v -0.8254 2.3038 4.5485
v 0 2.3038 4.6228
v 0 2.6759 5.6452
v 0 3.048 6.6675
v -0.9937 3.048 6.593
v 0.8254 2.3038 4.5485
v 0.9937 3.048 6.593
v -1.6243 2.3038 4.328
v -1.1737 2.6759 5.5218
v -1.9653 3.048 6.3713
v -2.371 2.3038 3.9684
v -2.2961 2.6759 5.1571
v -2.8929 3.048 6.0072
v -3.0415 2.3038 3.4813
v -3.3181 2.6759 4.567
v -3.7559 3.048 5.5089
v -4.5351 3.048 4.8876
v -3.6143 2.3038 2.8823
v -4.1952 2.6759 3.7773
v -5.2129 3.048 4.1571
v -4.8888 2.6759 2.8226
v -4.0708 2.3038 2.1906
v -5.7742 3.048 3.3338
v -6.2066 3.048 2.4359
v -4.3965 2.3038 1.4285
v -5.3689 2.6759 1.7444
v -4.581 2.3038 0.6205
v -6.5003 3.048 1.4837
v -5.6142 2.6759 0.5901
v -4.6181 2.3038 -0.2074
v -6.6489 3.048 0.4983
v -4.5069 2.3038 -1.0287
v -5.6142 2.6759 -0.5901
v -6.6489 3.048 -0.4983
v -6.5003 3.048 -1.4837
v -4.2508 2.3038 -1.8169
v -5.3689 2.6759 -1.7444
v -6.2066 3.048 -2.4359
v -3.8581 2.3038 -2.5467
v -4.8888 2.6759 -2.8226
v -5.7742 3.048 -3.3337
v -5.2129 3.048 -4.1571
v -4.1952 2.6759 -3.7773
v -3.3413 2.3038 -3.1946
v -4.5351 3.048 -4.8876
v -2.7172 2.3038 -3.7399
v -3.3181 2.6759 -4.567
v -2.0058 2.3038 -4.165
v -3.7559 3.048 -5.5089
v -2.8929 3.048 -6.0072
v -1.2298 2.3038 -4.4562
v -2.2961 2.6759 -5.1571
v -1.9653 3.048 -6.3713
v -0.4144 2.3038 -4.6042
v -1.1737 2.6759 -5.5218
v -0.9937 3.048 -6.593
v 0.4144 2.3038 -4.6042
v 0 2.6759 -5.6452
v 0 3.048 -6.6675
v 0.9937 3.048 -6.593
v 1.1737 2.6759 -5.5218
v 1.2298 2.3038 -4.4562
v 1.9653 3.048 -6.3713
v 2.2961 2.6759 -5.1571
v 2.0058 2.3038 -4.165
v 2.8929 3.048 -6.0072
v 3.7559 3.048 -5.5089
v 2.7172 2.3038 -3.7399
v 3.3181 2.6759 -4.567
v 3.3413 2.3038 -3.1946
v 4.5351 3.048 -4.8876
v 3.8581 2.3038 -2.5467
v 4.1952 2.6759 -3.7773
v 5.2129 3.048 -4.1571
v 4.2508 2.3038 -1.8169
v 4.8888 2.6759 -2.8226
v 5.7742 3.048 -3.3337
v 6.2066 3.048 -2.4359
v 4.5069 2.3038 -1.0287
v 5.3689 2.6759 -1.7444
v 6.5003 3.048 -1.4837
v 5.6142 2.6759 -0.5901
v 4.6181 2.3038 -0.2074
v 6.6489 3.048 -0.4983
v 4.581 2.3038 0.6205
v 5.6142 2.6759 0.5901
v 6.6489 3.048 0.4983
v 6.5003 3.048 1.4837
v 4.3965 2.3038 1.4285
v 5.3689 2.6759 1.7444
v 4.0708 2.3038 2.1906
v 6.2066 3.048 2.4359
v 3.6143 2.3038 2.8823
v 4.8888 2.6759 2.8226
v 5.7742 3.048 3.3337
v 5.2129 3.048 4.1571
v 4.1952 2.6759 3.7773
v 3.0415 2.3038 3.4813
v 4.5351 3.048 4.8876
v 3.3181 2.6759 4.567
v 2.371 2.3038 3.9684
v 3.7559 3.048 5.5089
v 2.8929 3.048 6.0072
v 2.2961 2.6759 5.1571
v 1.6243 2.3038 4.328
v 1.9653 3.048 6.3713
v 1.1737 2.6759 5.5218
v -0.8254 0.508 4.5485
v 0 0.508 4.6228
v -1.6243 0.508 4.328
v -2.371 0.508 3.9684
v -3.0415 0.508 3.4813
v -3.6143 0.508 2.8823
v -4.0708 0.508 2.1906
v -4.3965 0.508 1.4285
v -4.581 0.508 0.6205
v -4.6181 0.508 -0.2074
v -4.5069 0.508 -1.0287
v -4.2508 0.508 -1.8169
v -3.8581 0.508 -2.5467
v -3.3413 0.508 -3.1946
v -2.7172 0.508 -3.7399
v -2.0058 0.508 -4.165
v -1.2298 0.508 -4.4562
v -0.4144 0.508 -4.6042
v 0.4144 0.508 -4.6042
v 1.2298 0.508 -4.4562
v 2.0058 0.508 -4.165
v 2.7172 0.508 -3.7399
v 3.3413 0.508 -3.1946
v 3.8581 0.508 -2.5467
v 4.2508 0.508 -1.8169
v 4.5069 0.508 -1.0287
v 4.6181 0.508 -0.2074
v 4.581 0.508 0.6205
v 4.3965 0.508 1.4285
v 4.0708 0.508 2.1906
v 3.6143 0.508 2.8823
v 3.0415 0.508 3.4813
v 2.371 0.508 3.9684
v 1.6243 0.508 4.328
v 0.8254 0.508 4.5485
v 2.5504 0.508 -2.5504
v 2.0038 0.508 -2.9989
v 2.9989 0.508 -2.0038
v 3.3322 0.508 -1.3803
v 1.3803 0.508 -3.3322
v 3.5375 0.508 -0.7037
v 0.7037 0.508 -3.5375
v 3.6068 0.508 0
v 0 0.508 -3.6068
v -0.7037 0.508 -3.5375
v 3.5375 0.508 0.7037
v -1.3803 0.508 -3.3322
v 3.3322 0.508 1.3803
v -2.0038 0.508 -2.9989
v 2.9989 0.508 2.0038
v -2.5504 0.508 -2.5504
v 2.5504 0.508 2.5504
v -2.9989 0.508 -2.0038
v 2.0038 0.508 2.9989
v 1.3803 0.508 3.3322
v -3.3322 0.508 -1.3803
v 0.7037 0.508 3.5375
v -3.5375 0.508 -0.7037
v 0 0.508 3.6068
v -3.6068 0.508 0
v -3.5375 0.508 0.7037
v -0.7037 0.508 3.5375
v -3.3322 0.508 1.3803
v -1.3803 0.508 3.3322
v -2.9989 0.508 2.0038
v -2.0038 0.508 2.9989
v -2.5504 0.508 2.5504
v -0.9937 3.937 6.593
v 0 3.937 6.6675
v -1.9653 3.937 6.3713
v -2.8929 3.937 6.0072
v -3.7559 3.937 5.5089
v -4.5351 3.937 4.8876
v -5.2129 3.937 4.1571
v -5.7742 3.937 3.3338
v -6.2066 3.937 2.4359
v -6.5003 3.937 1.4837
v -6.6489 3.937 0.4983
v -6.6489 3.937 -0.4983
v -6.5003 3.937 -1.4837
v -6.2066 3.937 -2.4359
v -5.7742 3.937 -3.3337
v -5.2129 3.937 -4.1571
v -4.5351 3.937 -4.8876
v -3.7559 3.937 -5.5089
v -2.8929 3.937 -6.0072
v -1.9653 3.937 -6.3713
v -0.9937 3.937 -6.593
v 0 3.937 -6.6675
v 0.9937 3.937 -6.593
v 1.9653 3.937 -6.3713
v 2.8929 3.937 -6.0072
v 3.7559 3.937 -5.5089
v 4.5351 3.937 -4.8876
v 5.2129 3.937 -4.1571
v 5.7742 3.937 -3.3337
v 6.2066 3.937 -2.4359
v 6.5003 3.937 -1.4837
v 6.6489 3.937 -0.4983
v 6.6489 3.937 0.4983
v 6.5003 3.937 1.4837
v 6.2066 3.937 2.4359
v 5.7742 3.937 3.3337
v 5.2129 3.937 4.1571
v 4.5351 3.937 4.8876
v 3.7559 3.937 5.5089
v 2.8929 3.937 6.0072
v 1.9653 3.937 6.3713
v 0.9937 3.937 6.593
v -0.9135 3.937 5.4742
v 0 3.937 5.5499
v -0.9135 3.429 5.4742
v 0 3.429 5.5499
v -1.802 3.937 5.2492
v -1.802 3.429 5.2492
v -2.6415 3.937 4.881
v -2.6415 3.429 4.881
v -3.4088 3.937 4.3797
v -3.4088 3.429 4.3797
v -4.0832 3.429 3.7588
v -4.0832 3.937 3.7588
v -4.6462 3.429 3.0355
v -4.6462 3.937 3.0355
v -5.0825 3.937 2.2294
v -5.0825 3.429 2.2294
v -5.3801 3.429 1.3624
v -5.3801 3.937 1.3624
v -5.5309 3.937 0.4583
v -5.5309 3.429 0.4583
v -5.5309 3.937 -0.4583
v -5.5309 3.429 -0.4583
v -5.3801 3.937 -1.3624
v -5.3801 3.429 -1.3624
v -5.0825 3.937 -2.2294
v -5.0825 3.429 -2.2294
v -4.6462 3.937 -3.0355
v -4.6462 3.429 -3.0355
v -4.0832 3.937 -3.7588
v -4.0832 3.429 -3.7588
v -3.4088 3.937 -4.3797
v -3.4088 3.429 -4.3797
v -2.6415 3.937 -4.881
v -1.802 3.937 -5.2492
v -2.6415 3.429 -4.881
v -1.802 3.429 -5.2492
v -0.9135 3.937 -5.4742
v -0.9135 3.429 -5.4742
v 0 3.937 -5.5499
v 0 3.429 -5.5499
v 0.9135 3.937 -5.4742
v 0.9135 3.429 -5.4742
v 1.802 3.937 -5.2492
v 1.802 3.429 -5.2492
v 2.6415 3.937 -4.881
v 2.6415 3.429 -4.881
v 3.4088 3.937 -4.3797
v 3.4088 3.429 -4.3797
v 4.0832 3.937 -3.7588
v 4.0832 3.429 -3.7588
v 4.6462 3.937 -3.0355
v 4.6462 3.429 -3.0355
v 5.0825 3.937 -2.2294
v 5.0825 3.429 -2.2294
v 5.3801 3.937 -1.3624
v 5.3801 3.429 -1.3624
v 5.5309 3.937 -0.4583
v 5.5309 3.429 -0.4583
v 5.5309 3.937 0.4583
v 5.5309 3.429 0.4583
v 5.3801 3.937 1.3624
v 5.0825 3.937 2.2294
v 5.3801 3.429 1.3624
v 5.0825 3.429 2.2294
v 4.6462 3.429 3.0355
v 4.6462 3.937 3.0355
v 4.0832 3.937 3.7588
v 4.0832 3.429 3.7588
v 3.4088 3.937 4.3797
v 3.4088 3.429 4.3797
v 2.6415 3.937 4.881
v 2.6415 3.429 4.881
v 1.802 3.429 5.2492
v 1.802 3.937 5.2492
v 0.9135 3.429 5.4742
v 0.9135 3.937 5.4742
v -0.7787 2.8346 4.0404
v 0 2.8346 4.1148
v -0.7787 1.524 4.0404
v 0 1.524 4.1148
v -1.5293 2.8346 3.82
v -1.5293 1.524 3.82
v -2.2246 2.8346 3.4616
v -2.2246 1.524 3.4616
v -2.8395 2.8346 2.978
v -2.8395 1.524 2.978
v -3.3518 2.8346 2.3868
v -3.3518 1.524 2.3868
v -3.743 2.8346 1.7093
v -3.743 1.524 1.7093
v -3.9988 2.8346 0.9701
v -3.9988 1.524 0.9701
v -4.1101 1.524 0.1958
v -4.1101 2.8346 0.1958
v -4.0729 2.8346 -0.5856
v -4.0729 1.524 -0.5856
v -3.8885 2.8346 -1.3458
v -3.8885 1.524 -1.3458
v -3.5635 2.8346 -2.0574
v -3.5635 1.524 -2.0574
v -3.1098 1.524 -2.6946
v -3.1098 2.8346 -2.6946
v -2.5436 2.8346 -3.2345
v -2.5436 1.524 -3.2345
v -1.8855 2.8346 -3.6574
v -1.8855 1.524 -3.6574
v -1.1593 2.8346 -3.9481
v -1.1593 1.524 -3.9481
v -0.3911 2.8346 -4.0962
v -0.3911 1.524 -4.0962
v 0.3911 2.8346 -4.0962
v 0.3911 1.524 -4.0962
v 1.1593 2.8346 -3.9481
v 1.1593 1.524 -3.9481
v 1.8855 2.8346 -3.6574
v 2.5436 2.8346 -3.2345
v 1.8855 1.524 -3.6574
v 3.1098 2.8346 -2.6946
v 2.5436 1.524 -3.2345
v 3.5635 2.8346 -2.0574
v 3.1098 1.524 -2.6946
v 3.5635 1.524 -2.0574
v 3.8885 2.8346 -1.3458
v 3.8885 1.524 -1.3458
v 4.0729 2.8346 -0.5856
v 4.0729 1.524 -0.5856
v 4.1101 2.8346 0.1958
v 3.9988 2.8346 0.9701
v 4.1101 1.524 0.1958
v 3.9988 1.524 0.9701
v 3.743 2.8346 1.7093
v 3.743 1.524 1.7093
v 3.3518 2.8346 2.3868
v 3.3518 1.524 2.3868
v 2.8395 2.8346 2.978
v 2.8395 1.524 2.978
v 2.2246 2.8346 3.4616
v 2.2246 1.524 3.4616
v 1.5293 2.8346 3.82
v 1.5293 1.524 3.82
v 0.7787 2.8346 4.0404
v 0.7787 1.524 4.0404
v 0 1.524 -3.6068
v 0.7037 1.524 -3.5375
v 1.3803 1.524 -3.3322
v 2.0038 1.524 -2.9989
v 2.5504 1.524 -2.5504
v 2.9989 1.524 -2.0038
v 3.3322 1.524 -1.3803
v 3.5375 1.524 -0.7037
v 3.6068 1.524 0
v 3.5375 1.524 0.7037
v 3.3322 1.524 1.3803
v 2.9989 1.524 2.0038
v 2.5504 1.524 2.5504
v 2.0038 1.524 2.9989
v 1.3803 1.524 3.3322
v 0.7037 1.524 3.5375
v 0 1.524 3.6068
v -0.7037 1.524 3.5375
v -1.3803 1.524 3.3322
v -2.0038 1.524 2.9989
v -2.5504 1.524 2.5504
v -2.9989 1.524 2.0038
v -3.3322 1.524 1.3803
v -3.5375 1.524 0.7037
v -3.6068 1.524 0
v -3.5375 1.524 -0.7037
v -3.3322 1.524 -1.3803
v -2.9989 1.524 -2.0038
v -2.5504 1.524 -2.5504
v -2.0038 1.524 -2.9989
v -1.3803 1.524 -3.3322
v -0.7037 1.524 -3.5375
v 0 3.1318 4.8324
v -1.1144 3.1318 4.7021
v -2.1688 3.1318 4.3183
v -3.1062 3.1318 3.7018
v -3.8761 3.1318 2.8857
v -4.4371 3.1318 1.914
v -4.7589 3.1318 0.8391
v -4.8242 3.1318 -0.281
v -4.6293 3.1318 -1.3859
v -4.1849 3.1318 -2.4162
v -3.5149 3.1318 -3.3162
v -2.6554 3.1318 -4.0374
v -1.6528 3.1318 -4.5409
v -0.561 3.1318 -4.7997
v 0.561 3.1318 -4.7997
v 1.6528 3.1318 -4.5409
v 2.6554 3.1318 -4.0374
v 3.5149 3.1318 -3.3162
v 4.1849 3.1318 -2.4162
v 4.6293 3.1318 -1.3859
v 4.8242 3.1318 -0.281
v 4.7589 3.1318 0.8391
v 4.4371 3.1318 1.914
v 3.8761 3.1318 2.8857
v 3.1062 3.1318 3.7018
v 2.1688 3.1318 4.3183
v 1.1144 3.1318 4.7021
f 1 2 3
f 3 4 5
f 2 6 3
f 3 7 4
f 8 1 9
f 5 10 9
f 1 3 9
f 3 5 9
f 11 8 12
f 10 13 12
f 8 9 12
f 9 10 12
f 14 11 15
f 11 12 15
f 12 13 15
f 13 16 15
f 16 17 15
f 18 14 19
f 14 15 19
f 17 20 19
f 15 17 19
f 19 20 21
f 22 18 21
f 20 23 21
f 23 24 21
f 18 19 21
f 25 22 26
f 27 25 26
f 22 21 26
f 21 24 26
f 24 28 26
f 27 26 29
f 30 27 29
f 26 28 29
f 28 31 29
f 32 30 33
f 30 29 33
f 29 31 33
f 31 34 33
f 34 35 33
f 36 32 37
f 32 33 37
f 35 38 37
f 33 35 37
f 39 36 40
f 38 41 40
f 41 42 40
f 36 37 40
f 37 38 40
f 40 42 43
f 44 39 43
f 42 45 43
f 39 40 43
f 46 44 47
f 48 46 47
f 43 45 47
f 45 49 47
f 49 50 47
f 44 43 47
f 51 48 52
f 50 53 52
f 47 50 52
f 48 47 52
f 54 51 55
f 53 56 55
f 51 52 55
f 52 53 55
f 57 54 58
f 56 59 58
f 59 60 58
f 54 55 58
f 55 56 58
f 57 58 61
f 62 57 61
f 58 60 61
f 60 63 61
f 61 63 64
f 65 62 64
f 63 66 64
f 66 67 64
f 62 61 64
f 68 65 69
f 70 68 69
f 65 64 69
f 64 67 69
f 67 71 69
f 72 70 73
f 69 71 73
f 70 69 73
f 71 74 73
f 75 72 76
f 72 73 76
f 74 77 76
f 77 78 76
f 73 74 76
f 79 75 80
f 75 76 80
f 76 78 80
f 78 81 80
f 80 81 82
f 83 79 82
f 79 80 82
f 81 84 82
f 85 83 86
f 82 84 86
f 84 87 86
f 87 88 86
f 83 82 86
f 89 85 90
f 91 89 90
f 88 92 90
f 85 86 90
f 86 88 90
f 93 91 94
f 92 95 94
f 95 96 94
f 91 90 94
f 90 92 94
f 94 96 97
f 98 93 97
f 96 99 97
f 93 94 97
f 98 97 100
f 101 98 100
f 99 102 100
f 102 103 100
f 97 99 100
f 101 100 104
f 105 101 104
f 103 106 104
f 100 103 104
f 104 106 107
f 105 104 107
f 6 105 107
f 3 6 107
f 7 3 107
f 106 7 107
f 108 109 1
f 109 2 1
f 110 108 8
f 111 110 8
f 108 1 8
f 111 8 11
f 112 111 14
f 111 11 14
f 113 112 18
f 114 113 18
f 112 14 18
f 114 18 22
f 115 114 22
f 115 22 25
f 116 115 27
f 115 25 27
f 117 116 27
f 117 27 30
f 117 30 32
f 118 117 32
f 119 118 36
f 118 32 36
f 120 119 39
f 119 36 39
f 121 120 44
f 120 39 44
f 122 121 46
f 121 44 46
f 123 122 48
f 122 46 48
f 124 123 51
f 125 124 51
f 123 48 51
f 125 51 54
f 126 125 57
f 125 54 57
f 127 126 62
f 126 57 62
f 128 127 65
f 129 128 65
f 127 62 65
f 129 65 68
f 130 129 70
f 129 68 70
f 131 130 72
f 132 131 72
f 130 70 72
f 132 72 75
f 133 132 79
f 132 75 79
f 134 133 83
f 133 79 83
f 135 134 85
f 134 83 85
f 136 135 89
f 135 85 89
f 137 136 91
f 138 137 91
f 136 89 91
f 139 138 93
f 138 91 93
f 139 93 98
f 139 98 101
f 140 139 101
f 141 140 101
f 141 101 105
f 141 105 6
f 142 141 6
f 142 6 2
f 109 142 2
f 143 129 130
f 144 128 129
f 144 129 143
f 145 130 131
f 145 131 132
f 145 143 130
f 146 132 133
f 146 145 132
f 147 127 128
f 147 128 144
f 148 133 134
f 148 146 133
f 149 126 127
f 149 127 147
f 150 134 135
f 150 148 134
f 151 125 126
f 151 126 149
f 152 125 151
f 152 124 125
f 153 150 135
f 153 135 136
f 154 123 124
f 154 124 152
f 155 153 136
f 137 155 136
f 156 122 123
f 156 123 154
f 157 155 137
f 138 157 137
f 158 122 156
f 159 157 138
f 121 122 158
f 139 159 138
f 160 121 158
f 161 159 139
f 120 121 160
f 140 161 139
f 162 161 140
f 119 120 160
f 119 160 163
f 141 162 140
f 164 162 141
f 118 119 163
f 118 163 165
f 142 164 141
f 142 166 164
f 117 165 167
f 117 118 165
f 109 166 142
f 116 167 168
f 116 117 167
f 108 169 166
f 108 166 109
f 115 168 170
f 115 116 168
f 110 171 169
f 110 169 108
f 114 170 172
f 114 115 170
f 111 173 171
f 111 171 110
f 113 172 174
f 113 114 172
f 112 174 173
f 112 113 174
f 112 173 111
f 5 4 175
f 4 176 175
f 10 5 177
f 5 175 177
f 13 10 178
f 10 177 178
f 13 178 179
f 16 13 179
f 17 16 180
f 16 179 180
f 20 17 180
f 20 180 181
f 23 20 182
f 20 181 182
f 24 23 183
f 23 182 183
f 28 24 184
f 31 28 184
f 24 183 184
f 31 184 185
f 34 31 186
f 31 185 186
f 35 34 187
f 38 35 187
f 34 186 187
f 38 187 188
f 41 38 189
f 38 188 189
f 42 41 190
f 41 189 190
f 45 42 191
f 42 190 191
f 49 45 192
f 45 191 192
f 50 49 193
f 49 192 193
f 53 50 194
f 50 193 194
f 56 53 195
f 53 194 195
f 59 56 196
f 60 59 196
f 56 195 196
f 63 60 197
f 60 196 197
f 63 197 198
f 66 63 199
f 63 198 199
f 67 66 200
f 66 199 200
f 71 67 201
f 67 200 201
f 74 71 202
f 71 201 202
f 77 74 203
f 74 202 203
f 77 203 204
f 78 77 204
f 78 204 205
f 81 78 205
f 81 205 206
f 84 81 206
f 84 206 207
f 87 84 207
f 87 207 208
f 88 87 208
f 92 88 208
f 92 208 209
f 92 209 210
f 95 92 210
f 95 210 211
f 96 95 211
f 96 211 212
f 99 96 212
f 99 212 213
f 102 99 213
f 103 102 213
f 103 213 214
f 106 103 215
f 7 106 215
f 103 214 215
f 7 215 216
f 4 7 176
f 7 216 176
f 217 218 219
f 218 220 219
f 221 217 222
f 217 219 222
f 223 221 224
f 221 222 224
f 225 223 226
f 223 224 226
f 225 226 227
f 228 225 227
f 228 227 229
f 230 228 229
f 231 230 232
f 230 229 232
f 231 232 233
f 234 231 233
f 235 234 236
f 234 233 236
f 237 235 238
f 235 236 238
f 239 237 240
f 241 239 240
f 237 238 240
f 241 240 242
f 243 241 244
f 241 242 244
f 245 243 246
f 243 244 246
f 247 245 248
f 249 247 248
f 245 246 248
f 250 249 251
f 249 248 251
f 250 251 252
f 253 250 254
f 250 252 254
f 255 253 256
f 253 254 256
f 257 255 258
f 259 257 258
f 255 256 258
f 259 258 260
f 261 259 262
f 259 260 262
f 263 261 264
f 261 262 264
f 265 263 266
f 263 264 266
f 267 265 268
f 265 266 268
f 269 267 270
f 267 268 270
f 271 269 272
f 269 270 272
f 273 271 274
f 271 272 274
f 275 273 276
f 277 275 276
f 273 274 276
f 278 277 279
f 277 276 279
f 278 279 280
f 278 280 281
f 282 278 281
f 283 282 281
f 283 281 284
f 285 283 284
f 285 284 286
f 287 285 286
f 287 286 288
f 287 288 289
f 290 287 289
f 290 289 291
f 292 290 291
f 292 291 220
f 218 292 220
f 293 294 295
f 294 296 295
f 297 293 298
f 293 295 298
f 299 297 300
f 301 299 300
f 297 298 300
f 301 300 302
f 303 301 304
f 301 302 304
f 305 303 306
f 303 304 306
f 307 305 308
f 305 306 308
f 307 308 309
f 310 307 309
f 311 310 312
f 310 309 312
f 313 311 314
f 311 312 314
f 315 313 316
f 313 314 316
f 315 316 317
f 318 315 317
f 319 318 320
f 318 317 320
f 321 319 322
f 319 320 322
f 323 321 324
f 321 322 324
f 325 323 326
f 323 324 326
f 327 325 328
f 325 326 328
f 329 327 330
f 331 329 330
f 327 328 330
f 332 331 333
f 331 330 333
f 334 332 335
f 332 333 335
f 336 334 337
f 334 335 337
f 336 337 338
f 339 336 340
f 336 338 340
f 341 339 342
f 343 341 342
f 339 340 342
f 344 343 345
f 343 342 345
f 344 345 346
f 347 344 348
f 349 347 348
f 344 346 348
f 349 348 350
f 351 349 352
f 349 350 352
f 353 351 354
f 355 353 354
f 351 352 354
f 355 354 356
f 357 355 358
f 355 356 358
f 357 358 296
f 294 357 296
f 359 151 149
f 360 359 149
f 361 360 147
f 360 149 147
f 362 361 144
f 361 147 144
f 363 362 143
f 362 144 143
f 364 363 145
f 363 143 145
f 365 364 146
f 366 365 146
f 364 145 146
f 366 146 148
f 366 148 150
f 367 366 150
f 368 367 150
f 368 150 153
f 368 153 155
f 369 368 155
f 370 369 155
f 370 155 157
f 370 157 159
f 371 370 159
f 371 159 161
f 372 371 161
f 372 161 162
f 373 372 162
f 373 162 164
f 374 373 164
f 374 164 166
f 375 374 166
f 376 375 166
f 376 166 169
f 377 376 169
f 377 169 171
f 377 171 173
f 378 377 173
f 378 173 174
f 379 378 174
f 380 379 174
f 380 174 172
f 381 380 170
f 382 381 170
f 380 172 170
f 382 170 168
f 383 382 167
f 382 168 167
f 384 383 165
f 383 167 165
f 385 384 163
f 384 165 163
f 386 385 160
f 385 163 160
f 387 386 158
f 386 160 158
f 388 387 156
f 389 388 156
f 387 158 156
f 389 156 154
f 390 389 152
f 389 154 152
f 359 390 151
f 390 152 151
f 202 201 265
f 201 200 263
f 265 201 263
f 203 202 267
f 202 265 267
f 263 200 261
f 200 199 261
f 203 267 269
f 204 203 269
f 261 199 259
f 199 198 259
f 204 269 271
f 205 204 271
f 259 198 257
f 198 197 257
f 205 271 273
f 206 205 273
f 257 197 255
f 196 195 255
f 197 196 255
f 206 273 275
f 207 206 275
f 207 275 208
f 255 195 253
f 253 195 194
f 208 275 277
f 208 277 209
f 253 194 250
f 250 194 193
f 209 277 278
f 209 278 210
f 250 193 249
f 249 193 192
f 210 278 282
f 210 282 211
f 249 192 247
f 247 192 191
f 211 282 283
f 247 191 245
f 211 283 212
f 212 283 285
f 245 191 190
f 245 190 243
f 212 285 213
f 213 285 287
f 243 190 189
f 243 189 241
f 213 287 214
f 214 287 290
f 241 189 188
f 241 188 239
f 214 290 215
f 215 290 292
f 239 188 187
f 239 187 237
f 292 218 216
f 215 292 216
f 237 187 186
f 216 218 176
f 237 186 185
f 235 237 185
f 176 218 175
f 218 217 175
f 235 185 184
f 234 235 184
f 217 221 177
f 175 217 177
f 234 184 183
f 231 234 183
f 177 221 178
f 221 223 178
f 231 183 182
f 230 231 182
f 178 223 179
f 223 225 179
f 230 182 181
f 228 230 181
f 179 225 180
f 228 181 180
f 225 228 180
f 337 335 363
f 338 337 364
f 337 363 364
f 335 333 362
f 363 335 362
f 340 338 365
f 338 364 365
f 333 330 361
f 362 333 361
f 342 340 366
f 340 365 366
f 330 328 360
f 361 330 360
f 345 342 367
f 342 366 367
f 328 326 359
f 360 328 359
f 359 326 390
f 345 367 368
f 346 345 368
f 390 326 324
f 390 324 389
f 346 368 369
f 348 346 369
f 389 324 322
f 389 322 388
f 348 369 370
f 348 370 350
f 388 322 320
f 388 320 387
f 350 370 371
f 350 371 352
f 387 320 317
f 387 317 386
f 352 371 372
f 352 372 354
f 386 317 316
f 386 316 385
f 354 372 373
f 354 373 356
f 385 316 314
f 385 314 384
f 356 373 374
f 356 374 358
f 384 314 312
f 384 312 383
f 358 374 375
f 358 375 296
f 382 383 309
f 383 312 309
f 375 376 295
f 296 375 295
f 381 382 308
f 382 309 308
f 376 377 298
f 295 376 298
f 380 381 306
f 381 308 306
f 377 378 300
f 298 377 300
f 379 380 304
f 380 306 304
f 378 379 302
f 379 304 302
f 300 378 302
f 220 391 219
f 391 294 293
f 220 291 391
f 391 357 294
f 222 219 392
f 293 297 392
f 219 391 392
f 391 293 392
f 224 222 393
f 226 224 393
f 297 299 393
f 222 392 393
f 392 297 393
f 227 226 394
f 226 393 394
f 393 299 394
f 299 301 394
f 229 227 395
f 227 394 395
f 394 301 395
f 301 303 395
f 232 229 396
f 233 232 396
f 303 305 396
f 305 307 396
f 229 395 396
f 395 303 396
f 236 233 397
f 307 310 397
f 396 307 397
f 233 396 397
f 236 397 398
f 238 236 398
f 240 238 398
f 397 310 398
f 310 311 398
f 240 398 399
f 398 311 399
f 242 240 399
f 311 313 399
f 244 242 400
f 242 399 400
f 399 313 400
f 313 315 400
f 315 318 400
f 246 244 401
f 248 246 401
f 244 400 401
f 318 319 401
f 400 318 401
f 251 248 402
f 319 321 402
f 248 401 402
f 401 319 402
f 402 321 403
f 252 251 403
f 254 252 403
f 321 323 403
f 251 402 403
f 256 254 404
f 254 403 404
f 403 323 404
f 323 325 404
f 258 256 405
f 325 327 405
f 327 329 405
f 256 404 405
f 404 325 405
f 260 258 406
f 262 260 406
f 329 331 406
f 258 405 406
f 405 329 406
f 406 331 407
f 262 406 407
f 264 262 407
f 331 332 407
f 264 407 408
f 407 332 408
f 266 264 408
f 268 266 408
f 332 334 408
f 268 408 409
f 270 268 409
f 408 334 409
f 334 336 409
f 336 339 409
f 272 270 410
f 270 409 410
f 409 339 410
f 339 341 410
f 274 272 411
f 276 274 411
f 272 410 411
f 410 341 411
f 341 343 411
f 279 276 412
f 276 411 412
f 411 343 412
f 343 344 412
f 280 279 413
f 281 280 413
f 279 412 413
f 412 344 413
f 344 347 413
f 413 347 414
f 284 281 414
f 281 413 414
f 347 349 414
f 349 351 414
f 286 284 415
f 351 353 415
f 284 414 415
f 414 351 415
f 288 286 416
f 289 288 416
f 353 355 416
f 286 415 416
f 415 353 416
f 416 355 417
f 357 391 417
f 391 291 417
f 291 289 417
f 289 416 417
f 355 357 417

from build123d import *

# Parameters (mm, degrees)
SKETCH3_R      = 4.6228
SKETCH3_R_2    = 4.1148
EXTRUDE2_DEPTH = 0.508
SKETCH6_R      = 4.1148
EXTRUDE5_DEPTH = 1.016
SKETCH10_R     = 3.6068
EXTRUDE7_DEPTH = 4.429


with BuildPart() as part:
    # Sketch1 → Revolve1 (revolve)
    with BuildSketch(Plane.XY, mode=Mode.PRIVATE) as revolve1_sk:
        Polygon((4.6228, 0), (4.6228, 2.303790062), (6.6675, 3.048), (6.6675, 3.937), (5.5499, 3.937), (5.5499, 3.429), (4.1148, 2.834562117), (4.1148, 0), align=None)
    revolve(revolve1_sk.sketch.rotate(Axis((0, 0, 0), (0, -1, 0)), 90), axis=Axis((0, 0, 0), (0, -1, 0)))  # turned: the seam where the file's is

    # Sketch3 → Extrude2 (cut)
    with BuildSketch(Plane.XZ):
        with Locations(Location((0, 0, 0), (0, 0, 90))):  # turned: the seam where the file's is
            Circle(SKETCH3_R)
        with Locations(Location((0, 0, 0), (0, 0, 90))):  # turned: the seam where the file's is
            Circle(SKETCH3_R_2, mode=Mode.SUBTRACT)
    extrude(amount=-EXTRUDE2_DEPTH, mode=Mode.SUBTRACT)

    # Sketch6 → Extrude5 (add)
    with BuildSketch(Plane.XZ.offset(-0.508)):
        with Locations(Location((0, 0, 0), (0, 0, 90))):  # turned: the seam where the file's is
            Circle(SKETCH6_R)
    extrude(amount=-EXTRUDE5_DEPTH)

    # Sketch10 → Extrude7 (cut, through all)
    with BuildSketch(Plane.XZ.offset(-0.508)):
        with Locations(Location((0, 0, 0), (0, 0, 270))):  # turned: the seam where the file's is
            Circle(SKETCH10_R)
    extrude(amount=-EXTRUDE7_DEPTH, mode=Mode.SUBTRACT)


solid = part.part
